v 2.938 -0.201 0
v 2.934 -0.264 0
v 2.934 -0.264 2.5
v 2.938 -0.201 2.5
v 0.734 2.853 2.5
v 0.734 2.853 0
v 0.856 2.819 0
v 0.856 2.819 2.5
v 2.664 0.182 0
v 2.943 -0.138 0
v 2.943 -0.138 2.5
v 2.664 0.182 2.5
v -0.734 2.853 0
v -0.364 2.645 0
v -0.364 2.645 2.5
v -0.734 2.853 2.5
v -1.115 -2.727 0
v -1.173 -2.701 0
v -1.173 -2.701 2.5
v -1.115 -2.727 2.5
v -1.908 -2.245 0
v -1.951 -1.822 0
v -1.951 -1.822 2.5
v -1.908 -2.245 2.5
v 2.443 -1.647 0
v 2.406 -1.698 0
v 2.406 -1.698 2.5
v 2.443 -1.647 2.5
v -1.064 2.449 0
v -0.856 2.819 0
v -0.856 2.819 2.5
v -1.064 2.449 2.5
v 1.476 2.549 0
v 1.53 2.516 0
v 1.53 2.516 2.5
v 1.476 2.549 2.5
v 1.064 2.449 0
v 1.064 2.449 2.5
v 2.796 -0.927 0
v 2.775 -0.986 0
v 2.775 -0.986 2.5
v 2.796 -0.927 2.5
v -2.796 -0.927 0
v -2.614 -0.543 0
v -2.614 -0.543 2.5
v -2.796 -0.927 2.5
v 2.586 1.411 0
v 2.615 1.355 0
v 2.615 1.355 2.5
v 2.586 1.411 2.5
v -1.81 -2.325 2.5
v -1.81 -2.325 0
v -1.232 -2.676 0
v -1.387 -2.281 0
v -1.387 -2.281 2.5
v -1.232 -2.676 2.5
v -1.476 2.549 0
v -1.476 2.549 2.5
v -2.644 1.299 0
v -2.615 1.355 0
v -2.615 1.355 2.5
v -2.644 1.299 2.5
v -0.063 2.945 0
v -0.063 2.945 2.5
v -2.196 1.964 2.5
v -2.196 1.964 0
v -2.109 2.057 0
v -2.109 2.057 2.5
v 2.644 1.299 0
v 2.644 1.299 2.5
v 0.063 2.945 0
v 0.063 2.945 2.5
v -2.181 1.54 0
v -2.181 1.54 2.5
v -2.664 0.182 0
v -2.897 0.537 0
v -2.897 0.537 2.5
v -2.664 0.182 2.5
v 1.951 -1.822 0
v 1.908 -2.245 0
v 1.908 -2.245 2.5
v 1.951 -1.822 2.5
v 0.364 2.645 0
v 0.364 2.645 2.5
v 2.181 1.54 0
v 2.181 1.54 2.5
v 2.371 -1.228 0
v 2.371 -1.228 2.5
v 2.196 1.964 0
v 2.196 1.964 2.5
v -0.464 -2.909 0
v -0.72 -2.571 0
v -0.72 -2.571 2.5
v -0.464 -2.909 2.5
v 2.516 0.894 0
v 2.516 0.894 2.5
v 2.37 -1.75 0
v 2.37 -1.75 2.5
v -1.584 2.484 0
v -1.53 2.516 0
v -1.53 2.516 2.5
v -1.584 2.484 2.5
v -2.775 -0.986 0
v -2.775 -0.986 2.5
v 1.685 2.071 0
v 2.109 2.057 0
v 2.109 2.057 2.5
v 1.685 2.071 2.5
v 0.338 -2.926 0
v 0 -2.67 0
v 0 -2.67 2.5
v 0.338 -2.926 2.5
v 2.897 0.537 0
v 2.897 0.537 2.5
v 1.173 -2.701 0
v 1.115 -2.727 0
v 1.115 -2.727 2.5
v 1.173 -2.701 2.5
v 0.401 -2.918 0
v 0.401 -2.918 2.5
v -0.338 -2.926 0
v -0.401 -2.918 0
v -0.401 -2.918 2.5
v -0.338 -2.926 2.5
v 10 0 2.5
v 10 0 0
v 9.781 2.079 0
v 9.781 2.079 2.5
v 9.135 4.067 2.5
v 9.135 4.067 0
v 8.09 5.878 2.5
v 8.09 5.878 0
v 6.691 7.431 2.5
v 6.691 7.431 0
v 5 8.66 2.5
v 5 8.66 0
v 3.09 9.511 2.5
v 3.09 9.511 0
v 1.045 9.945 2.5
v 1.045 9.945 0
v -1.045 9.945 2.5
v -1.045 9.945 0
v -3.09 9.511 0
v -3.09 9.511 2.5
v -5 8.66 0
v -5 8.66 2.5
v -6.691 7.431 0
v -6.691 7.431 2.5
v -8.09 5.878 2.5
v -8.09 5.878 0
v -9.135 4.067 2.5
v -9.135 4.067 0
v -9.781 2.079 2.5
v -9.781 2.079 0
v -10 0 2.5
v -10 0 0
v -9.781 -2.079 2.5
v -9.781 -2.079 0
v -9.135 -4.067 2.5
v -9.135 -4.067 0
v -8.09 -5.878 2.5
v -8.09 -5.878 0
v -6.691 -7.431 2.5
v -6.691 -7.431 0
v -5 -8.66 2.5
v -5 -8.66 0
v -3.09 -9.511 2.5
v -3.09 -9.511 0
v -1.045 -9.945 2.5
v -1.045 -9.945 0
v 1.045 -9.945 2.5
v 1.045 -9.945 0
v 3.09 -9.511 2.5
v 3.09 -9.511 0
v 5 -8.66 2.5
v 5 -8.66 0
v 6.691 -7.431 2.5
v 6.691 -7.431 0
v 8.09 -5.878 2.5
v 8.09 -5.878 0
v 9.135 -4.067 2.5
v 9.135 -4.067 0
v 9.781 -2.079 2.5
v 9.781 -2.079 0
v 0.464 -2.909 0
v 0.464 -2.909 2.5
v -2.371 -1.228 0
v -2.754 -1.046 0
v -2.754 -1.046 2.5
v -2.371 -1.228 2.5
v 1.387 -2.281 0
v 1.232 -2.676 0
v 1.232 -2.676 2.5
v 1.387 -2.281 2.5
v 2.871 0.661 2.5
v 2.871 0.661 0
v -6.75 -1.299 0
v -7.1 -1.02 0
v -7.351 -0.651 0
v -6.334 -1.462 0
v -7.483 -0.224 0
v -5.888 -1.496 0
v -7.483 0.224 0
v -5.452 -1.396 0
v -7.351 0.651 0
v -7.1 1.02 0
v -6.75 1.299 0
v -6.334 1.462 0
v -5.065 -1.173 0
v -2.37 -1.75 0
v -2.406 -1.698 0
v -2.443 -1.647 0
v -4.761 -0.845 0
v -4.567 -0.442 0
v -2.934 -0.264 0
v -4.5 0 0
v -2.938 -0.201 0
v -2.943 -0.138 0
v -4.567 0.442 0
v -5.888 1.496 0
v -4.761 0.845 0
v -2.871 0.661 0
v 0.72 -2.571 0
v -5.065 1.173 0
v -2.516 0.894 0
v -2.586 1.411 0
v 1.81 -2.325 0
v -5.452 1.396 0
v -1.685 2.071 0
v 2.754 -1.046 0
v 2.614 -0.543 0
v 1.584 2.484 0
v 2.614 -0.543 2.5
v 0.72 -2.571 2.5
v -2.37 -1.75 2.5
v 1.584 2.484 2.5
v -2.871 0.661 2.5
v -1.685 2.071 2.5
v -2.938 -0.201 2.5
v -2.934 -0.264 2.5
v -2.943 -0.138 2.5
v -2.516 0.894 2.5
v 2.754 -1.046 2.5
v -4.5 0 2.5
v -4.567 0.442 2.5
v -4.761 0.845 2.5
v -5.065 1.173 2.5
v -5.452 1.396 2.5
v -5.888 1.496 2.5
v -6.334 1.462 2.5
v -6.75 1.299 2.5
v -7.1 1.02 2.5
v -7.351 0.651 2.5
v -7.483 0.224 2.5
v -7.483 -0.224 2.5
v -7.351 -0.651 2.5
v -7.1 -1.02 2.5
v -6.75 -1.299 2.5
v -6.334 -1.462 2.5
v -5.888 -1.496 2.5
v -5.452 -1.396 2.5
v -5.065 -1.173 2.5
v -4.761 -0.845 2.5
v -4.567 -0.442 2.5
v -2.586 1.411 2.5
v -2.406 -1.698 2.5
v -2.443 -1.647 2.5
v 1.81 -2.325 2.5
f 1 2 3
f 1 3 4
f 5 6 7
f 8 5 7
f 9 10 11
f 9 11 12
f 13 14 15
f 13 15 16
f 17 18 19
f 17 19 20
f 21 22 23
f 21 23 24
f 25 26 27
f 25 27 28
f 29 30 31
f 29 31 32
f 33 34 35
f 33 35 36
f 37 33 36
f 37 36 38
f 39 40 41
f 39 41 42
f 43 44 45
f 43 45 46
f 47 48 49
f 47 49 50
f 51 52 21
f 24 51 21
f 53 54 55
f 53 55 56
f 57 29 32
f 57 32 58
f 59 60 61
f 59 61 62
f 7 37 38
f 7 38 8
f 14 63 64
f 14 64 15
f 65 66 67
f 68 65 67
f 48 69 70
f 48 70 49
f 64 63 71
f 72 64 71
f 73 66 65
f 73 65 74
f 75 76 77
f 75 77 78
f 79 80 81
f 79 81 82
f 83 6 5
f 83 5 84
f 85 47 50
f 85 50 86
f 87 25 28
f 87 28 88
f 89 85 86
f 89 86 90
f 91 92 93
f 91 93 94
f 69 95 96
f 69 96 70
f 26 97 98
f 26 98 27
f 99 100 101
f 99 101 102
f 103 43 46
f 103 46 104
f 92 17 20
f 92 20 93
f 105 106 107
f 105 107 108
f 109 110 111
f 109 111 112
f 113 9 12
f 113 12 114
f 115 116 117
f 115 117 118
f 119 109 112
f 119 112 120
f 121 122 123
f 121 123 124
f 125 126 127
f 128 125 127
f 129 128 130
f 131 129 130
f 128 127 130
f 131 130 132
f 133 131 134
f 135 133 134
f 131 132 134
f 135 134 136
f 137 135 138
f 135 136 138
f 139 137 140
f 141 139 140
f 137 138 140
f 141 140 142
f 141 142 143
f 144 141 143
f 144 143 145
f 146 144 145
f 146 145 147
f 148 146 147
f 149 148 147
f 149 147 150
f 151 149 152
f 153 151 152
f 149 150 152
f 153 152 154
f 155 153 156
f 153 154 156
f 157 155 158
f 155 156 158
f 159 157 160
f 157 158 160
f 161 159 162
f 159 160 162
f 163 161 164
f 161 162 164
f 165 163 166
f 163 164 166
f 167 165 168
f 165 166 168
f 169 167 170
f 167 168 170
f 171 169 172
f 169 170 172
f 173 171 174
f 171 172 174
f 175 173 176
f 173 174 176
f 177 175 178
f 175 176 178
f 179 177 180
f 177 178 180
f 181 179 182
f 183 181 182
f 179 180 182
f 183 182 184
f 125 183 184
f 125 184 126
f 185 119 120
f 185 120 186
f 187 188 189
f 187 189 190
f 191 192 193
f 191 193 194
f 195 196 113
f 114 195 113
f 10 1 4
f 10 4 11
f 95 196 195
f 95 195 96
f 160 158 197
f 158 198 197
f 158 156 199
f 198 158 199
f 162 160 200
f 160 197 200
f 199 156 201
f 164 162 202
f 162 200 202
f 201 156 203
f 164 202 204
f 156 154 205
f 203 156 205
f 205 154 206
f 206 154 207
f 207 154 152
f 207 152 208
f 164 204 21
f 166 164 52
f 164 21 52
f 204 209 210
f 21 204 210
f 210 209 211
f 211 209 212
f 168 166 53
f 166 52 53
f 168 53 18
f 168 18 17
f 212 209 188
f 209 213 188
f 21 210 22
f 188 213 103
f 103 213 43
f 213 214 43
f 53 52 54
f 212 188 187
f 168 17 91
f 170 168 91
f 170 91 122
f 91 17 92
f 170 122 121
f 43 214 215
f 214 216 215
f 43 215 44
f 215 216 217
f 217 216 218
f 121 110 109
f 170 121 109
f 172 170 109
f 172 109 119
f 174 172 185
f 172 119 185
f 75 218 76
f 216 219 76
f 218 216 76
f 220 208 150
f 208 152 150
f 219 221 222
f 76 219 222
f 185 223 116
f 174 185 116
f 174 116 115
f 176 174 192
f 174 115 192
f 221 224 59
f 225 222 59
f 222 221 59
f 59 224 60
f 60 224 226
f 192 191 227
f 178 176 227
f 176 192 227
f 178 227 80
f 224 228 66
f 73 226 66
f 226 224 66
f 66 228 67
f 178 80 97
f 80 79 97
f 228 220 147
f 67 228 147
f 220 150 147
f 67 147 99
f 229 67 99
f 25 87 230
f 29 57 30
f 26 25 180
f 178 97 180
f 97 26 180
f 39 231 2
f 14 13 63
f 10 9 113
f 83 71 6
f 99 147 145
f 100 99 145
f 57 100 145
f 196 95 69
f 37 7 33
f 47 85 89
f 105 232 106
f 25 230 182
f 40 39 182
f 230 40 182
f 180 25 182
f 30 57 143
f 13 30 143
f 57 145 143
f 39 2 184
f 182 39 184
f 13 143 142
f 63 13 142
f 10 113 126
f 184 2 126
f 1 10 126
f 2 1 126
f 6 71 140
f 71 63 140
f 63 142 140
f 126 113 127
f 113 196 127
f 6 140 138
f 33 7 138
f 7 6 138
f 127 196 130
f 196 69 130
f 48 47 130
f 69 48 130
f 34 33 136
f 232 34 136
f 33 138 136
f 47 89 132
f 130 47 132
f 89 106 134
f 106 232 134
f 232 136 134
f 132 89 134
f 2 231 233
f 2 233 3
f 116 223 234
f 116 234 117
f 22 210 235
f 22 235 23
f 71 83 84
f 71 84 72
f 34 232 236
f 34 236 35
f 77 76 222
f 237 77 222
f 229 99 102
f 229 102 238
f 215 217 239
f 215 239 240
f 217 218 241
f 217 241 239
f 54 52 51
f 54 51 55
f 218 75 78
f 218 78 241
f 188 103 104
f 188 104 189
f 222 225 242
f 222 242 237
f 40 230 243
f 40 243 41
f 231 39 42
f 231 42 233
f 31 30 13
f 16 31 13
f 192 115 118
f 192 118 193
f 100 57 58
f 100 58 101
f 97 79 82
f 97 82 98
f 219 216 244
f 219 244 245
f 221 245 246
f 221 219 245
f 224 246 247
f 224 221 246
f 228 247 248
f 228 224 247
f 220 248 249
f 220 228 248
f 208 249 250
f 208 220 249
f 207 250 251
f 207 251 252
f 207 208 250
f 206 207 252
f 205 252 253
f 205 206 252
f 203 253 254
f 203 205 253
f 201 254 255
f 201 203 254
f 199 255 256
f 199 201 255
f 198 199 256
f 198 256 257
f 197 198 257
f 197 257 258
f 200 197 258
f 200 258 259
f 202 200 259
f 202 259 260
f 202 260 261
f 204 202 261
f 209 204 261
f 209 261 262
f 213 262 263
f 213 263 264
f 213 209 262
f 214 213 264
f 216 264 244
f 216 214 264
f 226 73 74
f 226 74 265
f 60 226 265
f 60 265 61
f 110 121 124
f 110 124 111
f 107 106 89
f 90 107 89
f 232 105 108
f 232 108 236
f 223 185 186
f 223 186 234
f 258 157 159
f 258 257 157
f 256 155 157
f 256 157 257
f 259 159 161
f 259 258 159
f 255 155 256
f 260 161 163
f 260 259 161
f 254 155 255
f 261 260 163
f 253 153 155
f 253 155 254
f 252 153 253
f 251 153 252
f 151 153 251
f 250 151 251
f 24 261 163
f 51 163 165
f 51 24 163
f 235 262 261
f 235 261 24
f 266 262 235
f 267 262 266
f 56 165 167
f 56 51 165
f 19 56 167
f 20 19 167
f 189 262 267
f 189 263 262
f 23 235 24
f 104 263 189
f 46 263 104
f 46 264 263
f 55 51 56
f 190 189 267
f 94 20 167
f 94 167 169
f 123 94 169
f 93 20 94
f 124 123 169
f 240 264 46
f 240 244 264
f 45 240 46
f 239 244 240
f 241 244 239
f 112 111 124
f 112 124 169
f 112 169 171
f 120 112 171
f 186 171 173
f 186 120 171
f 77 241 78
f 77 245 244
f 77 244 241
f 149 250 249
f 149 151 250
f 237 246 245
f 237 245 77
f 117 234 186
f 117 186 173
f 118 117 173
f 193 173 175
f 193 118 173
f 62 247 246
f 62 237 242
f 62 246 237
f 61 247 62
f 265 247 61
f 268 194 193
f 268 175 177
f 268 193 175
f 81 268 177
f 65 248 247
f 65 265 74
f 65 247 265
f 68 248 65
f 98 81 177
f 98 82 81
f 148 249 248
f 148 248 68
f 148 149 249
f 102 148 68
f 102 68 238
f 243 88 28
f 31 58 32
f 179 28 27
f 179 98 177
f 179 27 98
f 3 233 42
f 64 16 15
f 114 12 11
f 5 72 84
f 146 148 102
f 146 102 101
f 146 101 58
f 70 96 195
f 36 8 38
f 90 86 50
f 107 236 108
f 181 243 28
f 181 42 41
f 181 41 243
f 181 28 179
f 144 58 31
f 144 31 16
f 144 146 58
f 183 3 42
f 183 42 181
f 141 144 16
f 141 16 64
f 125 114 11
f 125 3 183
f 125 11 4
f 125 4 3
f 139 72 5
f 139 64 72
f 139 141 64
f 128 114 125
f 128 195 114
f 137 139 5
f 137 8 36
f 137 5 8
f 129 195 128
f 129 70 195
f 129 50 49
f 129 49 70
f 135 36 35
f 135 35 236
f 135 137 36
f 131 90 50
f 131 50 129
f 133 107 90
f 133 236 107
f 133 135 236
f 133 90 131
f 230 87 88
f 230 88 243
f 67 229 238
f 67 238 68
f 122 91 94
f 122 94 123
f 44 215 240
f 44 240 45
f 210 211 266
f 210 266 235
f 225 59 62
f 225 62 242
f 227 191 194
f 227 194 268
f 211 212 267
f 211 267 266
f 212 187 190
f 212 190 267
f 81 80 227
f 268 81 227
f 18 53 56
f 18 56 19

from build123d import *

# Parameters (mm, degrees)
SKETCH1_R              = 10
BOSS_EXTRUDE1_DEPTH    = 2.5
CUT_EXTRUDE1_OUTLINE_R = 1.5
CUT_EXTRUDE1_DEPTH     = 2.5


# Read off the part's stored shape, not the designer's step: Cut-Extrude1
with BuildPart() as part:
    # Sketch1 → Boss-Extrude1 (new body)
    with BuildSketch(Plane.XY):
        Circle(SKETCH1_R)
        Polygon((-2.644215925, 1.298692578), (-2.51581008, 0.894119117), (-2.870737377, 0.661322297), (-2.883640833, 0.599227456), (-2.896544289, 0.537132615), (-2.663747469, 0.182205319), (-2.942705268, -0.137717003), (-2.938377242, -0.20099051), (-2.934049215, -0.264264016), (-2.614126893, -0.543221815), (-2.796426171, -0.926542463), (-2.775187652, -0.986301929), (-2.753949133, -1.046061394), (-2.370628485, -1.228360672), (-2.442748938, -1.646650507), (-2.40617509, -1.698463845), (-2.369601242, -1.750277184), (-1.951311407, -1.822397637), (-1.907904191, -2.244634016), (-1.858707529, -2.284658469), (-1.809510867, -2.324682922), (-1.387274489, -2.281275706), (-1.231558919, -2.676143288), (-1.173388134, -2.701410425), (-1.115217349, -2.726677563), (-0.720349768, -2.570961993), (-0.463874555, -2.909175255), (-0.401043909, -2.917811129), (-0.338213262, -2.926447002), (0, -2.669971789), (0.338213262, -2.926447002), (0.401043909, -2.917811129), (0.463874555, -2.909175255), (0.720349768, -2.570961993), (1.115217349, -2.726677563), (1.173388134, -2.701410425), (1.231558919, -2.676143288), (1.387274489, -2.281275706), (1.809510867, -2.324682922), (1.858707529, -2.284658469), (1.907904191, -2.244634016), (1.951311407, -1.822397637), (2.369601242, -1.750277184), (2.40617509, -1.698463845), (2.442748938, -1.646650507), (2.370628485, -1.228360672), (2.753949133, -1.046061394), (2.775187652, -0.986301929), (2.796426171, -0.926542463), (2.614126893, -0.543221815), (2.934049215, -0.264264016), (2.938377242, -0.20099051), (2.942705268, -0.137717003), (2.663747469, 0.182205319), (2.896544289, 0.537132615), (2.883640833, 0.599227456), (2.870737377, 0.661322297), (2.51581008, 0.894119117), (2.644215925, 1.298692578), (2.615037976, 1.355003462), (2.585860027, 1.411314347), (2.181286567, 1.539720192), (2.195778161, 1.963934453), (2.152489715, 2.010285061), (2.109201269, 2.056635669), (1.684987008, 2.071127263), (1.584489576, 2.483520294), (1.530301139, 2.516473013), (1.476112702, 2.549425731), (1.063719671, 2.4489283), (0.855686648, 2.818914796), (0.794617128, 2.836025673), (0.733547608, 2.85313655), (0.363561112, 2.645103528), (0.063421356, 2.945243283), (0, 2.945243283), (-0.063421356, 2.945243283), (-0.363561112, 2.645103528), (-0.733547608, 2.85313655), (-0.794617128, 2.836025673), (-0.855686648, 2.818914796), (-1.063719671, 2.4489283), (-1.476112702, 2.549425731), (-1.530301139, 2.516473013), (-1.584489576, 2.483520294), (-1.684987008, 2.071127263), (-2.109201269, 2.056635669), (-2.152489715, 2.010285061), (-2.195778161, 1.963934453), (-2.181286567, 1.539720192), (-2.585860027, 1.411314347), (-2.615037976, 1.355003462), align=None, mode=Mode.SUBTRACT)
    extrude(amount=BOSS_EXTRUDE1_DEPTH)

    # Cut-Extrude1 outline → Cut-Extrude1 (cut)
    with BuildSketch(Plane.XY):
        with Locations((-6, 0)):
            Circle(CUT_EXTRUDE1_OUTLINE_R)
    extrude(amount=CUT_EXTRUDE1_DEPTH, mode=Mode.SUBTRACT)


solid = part.part
